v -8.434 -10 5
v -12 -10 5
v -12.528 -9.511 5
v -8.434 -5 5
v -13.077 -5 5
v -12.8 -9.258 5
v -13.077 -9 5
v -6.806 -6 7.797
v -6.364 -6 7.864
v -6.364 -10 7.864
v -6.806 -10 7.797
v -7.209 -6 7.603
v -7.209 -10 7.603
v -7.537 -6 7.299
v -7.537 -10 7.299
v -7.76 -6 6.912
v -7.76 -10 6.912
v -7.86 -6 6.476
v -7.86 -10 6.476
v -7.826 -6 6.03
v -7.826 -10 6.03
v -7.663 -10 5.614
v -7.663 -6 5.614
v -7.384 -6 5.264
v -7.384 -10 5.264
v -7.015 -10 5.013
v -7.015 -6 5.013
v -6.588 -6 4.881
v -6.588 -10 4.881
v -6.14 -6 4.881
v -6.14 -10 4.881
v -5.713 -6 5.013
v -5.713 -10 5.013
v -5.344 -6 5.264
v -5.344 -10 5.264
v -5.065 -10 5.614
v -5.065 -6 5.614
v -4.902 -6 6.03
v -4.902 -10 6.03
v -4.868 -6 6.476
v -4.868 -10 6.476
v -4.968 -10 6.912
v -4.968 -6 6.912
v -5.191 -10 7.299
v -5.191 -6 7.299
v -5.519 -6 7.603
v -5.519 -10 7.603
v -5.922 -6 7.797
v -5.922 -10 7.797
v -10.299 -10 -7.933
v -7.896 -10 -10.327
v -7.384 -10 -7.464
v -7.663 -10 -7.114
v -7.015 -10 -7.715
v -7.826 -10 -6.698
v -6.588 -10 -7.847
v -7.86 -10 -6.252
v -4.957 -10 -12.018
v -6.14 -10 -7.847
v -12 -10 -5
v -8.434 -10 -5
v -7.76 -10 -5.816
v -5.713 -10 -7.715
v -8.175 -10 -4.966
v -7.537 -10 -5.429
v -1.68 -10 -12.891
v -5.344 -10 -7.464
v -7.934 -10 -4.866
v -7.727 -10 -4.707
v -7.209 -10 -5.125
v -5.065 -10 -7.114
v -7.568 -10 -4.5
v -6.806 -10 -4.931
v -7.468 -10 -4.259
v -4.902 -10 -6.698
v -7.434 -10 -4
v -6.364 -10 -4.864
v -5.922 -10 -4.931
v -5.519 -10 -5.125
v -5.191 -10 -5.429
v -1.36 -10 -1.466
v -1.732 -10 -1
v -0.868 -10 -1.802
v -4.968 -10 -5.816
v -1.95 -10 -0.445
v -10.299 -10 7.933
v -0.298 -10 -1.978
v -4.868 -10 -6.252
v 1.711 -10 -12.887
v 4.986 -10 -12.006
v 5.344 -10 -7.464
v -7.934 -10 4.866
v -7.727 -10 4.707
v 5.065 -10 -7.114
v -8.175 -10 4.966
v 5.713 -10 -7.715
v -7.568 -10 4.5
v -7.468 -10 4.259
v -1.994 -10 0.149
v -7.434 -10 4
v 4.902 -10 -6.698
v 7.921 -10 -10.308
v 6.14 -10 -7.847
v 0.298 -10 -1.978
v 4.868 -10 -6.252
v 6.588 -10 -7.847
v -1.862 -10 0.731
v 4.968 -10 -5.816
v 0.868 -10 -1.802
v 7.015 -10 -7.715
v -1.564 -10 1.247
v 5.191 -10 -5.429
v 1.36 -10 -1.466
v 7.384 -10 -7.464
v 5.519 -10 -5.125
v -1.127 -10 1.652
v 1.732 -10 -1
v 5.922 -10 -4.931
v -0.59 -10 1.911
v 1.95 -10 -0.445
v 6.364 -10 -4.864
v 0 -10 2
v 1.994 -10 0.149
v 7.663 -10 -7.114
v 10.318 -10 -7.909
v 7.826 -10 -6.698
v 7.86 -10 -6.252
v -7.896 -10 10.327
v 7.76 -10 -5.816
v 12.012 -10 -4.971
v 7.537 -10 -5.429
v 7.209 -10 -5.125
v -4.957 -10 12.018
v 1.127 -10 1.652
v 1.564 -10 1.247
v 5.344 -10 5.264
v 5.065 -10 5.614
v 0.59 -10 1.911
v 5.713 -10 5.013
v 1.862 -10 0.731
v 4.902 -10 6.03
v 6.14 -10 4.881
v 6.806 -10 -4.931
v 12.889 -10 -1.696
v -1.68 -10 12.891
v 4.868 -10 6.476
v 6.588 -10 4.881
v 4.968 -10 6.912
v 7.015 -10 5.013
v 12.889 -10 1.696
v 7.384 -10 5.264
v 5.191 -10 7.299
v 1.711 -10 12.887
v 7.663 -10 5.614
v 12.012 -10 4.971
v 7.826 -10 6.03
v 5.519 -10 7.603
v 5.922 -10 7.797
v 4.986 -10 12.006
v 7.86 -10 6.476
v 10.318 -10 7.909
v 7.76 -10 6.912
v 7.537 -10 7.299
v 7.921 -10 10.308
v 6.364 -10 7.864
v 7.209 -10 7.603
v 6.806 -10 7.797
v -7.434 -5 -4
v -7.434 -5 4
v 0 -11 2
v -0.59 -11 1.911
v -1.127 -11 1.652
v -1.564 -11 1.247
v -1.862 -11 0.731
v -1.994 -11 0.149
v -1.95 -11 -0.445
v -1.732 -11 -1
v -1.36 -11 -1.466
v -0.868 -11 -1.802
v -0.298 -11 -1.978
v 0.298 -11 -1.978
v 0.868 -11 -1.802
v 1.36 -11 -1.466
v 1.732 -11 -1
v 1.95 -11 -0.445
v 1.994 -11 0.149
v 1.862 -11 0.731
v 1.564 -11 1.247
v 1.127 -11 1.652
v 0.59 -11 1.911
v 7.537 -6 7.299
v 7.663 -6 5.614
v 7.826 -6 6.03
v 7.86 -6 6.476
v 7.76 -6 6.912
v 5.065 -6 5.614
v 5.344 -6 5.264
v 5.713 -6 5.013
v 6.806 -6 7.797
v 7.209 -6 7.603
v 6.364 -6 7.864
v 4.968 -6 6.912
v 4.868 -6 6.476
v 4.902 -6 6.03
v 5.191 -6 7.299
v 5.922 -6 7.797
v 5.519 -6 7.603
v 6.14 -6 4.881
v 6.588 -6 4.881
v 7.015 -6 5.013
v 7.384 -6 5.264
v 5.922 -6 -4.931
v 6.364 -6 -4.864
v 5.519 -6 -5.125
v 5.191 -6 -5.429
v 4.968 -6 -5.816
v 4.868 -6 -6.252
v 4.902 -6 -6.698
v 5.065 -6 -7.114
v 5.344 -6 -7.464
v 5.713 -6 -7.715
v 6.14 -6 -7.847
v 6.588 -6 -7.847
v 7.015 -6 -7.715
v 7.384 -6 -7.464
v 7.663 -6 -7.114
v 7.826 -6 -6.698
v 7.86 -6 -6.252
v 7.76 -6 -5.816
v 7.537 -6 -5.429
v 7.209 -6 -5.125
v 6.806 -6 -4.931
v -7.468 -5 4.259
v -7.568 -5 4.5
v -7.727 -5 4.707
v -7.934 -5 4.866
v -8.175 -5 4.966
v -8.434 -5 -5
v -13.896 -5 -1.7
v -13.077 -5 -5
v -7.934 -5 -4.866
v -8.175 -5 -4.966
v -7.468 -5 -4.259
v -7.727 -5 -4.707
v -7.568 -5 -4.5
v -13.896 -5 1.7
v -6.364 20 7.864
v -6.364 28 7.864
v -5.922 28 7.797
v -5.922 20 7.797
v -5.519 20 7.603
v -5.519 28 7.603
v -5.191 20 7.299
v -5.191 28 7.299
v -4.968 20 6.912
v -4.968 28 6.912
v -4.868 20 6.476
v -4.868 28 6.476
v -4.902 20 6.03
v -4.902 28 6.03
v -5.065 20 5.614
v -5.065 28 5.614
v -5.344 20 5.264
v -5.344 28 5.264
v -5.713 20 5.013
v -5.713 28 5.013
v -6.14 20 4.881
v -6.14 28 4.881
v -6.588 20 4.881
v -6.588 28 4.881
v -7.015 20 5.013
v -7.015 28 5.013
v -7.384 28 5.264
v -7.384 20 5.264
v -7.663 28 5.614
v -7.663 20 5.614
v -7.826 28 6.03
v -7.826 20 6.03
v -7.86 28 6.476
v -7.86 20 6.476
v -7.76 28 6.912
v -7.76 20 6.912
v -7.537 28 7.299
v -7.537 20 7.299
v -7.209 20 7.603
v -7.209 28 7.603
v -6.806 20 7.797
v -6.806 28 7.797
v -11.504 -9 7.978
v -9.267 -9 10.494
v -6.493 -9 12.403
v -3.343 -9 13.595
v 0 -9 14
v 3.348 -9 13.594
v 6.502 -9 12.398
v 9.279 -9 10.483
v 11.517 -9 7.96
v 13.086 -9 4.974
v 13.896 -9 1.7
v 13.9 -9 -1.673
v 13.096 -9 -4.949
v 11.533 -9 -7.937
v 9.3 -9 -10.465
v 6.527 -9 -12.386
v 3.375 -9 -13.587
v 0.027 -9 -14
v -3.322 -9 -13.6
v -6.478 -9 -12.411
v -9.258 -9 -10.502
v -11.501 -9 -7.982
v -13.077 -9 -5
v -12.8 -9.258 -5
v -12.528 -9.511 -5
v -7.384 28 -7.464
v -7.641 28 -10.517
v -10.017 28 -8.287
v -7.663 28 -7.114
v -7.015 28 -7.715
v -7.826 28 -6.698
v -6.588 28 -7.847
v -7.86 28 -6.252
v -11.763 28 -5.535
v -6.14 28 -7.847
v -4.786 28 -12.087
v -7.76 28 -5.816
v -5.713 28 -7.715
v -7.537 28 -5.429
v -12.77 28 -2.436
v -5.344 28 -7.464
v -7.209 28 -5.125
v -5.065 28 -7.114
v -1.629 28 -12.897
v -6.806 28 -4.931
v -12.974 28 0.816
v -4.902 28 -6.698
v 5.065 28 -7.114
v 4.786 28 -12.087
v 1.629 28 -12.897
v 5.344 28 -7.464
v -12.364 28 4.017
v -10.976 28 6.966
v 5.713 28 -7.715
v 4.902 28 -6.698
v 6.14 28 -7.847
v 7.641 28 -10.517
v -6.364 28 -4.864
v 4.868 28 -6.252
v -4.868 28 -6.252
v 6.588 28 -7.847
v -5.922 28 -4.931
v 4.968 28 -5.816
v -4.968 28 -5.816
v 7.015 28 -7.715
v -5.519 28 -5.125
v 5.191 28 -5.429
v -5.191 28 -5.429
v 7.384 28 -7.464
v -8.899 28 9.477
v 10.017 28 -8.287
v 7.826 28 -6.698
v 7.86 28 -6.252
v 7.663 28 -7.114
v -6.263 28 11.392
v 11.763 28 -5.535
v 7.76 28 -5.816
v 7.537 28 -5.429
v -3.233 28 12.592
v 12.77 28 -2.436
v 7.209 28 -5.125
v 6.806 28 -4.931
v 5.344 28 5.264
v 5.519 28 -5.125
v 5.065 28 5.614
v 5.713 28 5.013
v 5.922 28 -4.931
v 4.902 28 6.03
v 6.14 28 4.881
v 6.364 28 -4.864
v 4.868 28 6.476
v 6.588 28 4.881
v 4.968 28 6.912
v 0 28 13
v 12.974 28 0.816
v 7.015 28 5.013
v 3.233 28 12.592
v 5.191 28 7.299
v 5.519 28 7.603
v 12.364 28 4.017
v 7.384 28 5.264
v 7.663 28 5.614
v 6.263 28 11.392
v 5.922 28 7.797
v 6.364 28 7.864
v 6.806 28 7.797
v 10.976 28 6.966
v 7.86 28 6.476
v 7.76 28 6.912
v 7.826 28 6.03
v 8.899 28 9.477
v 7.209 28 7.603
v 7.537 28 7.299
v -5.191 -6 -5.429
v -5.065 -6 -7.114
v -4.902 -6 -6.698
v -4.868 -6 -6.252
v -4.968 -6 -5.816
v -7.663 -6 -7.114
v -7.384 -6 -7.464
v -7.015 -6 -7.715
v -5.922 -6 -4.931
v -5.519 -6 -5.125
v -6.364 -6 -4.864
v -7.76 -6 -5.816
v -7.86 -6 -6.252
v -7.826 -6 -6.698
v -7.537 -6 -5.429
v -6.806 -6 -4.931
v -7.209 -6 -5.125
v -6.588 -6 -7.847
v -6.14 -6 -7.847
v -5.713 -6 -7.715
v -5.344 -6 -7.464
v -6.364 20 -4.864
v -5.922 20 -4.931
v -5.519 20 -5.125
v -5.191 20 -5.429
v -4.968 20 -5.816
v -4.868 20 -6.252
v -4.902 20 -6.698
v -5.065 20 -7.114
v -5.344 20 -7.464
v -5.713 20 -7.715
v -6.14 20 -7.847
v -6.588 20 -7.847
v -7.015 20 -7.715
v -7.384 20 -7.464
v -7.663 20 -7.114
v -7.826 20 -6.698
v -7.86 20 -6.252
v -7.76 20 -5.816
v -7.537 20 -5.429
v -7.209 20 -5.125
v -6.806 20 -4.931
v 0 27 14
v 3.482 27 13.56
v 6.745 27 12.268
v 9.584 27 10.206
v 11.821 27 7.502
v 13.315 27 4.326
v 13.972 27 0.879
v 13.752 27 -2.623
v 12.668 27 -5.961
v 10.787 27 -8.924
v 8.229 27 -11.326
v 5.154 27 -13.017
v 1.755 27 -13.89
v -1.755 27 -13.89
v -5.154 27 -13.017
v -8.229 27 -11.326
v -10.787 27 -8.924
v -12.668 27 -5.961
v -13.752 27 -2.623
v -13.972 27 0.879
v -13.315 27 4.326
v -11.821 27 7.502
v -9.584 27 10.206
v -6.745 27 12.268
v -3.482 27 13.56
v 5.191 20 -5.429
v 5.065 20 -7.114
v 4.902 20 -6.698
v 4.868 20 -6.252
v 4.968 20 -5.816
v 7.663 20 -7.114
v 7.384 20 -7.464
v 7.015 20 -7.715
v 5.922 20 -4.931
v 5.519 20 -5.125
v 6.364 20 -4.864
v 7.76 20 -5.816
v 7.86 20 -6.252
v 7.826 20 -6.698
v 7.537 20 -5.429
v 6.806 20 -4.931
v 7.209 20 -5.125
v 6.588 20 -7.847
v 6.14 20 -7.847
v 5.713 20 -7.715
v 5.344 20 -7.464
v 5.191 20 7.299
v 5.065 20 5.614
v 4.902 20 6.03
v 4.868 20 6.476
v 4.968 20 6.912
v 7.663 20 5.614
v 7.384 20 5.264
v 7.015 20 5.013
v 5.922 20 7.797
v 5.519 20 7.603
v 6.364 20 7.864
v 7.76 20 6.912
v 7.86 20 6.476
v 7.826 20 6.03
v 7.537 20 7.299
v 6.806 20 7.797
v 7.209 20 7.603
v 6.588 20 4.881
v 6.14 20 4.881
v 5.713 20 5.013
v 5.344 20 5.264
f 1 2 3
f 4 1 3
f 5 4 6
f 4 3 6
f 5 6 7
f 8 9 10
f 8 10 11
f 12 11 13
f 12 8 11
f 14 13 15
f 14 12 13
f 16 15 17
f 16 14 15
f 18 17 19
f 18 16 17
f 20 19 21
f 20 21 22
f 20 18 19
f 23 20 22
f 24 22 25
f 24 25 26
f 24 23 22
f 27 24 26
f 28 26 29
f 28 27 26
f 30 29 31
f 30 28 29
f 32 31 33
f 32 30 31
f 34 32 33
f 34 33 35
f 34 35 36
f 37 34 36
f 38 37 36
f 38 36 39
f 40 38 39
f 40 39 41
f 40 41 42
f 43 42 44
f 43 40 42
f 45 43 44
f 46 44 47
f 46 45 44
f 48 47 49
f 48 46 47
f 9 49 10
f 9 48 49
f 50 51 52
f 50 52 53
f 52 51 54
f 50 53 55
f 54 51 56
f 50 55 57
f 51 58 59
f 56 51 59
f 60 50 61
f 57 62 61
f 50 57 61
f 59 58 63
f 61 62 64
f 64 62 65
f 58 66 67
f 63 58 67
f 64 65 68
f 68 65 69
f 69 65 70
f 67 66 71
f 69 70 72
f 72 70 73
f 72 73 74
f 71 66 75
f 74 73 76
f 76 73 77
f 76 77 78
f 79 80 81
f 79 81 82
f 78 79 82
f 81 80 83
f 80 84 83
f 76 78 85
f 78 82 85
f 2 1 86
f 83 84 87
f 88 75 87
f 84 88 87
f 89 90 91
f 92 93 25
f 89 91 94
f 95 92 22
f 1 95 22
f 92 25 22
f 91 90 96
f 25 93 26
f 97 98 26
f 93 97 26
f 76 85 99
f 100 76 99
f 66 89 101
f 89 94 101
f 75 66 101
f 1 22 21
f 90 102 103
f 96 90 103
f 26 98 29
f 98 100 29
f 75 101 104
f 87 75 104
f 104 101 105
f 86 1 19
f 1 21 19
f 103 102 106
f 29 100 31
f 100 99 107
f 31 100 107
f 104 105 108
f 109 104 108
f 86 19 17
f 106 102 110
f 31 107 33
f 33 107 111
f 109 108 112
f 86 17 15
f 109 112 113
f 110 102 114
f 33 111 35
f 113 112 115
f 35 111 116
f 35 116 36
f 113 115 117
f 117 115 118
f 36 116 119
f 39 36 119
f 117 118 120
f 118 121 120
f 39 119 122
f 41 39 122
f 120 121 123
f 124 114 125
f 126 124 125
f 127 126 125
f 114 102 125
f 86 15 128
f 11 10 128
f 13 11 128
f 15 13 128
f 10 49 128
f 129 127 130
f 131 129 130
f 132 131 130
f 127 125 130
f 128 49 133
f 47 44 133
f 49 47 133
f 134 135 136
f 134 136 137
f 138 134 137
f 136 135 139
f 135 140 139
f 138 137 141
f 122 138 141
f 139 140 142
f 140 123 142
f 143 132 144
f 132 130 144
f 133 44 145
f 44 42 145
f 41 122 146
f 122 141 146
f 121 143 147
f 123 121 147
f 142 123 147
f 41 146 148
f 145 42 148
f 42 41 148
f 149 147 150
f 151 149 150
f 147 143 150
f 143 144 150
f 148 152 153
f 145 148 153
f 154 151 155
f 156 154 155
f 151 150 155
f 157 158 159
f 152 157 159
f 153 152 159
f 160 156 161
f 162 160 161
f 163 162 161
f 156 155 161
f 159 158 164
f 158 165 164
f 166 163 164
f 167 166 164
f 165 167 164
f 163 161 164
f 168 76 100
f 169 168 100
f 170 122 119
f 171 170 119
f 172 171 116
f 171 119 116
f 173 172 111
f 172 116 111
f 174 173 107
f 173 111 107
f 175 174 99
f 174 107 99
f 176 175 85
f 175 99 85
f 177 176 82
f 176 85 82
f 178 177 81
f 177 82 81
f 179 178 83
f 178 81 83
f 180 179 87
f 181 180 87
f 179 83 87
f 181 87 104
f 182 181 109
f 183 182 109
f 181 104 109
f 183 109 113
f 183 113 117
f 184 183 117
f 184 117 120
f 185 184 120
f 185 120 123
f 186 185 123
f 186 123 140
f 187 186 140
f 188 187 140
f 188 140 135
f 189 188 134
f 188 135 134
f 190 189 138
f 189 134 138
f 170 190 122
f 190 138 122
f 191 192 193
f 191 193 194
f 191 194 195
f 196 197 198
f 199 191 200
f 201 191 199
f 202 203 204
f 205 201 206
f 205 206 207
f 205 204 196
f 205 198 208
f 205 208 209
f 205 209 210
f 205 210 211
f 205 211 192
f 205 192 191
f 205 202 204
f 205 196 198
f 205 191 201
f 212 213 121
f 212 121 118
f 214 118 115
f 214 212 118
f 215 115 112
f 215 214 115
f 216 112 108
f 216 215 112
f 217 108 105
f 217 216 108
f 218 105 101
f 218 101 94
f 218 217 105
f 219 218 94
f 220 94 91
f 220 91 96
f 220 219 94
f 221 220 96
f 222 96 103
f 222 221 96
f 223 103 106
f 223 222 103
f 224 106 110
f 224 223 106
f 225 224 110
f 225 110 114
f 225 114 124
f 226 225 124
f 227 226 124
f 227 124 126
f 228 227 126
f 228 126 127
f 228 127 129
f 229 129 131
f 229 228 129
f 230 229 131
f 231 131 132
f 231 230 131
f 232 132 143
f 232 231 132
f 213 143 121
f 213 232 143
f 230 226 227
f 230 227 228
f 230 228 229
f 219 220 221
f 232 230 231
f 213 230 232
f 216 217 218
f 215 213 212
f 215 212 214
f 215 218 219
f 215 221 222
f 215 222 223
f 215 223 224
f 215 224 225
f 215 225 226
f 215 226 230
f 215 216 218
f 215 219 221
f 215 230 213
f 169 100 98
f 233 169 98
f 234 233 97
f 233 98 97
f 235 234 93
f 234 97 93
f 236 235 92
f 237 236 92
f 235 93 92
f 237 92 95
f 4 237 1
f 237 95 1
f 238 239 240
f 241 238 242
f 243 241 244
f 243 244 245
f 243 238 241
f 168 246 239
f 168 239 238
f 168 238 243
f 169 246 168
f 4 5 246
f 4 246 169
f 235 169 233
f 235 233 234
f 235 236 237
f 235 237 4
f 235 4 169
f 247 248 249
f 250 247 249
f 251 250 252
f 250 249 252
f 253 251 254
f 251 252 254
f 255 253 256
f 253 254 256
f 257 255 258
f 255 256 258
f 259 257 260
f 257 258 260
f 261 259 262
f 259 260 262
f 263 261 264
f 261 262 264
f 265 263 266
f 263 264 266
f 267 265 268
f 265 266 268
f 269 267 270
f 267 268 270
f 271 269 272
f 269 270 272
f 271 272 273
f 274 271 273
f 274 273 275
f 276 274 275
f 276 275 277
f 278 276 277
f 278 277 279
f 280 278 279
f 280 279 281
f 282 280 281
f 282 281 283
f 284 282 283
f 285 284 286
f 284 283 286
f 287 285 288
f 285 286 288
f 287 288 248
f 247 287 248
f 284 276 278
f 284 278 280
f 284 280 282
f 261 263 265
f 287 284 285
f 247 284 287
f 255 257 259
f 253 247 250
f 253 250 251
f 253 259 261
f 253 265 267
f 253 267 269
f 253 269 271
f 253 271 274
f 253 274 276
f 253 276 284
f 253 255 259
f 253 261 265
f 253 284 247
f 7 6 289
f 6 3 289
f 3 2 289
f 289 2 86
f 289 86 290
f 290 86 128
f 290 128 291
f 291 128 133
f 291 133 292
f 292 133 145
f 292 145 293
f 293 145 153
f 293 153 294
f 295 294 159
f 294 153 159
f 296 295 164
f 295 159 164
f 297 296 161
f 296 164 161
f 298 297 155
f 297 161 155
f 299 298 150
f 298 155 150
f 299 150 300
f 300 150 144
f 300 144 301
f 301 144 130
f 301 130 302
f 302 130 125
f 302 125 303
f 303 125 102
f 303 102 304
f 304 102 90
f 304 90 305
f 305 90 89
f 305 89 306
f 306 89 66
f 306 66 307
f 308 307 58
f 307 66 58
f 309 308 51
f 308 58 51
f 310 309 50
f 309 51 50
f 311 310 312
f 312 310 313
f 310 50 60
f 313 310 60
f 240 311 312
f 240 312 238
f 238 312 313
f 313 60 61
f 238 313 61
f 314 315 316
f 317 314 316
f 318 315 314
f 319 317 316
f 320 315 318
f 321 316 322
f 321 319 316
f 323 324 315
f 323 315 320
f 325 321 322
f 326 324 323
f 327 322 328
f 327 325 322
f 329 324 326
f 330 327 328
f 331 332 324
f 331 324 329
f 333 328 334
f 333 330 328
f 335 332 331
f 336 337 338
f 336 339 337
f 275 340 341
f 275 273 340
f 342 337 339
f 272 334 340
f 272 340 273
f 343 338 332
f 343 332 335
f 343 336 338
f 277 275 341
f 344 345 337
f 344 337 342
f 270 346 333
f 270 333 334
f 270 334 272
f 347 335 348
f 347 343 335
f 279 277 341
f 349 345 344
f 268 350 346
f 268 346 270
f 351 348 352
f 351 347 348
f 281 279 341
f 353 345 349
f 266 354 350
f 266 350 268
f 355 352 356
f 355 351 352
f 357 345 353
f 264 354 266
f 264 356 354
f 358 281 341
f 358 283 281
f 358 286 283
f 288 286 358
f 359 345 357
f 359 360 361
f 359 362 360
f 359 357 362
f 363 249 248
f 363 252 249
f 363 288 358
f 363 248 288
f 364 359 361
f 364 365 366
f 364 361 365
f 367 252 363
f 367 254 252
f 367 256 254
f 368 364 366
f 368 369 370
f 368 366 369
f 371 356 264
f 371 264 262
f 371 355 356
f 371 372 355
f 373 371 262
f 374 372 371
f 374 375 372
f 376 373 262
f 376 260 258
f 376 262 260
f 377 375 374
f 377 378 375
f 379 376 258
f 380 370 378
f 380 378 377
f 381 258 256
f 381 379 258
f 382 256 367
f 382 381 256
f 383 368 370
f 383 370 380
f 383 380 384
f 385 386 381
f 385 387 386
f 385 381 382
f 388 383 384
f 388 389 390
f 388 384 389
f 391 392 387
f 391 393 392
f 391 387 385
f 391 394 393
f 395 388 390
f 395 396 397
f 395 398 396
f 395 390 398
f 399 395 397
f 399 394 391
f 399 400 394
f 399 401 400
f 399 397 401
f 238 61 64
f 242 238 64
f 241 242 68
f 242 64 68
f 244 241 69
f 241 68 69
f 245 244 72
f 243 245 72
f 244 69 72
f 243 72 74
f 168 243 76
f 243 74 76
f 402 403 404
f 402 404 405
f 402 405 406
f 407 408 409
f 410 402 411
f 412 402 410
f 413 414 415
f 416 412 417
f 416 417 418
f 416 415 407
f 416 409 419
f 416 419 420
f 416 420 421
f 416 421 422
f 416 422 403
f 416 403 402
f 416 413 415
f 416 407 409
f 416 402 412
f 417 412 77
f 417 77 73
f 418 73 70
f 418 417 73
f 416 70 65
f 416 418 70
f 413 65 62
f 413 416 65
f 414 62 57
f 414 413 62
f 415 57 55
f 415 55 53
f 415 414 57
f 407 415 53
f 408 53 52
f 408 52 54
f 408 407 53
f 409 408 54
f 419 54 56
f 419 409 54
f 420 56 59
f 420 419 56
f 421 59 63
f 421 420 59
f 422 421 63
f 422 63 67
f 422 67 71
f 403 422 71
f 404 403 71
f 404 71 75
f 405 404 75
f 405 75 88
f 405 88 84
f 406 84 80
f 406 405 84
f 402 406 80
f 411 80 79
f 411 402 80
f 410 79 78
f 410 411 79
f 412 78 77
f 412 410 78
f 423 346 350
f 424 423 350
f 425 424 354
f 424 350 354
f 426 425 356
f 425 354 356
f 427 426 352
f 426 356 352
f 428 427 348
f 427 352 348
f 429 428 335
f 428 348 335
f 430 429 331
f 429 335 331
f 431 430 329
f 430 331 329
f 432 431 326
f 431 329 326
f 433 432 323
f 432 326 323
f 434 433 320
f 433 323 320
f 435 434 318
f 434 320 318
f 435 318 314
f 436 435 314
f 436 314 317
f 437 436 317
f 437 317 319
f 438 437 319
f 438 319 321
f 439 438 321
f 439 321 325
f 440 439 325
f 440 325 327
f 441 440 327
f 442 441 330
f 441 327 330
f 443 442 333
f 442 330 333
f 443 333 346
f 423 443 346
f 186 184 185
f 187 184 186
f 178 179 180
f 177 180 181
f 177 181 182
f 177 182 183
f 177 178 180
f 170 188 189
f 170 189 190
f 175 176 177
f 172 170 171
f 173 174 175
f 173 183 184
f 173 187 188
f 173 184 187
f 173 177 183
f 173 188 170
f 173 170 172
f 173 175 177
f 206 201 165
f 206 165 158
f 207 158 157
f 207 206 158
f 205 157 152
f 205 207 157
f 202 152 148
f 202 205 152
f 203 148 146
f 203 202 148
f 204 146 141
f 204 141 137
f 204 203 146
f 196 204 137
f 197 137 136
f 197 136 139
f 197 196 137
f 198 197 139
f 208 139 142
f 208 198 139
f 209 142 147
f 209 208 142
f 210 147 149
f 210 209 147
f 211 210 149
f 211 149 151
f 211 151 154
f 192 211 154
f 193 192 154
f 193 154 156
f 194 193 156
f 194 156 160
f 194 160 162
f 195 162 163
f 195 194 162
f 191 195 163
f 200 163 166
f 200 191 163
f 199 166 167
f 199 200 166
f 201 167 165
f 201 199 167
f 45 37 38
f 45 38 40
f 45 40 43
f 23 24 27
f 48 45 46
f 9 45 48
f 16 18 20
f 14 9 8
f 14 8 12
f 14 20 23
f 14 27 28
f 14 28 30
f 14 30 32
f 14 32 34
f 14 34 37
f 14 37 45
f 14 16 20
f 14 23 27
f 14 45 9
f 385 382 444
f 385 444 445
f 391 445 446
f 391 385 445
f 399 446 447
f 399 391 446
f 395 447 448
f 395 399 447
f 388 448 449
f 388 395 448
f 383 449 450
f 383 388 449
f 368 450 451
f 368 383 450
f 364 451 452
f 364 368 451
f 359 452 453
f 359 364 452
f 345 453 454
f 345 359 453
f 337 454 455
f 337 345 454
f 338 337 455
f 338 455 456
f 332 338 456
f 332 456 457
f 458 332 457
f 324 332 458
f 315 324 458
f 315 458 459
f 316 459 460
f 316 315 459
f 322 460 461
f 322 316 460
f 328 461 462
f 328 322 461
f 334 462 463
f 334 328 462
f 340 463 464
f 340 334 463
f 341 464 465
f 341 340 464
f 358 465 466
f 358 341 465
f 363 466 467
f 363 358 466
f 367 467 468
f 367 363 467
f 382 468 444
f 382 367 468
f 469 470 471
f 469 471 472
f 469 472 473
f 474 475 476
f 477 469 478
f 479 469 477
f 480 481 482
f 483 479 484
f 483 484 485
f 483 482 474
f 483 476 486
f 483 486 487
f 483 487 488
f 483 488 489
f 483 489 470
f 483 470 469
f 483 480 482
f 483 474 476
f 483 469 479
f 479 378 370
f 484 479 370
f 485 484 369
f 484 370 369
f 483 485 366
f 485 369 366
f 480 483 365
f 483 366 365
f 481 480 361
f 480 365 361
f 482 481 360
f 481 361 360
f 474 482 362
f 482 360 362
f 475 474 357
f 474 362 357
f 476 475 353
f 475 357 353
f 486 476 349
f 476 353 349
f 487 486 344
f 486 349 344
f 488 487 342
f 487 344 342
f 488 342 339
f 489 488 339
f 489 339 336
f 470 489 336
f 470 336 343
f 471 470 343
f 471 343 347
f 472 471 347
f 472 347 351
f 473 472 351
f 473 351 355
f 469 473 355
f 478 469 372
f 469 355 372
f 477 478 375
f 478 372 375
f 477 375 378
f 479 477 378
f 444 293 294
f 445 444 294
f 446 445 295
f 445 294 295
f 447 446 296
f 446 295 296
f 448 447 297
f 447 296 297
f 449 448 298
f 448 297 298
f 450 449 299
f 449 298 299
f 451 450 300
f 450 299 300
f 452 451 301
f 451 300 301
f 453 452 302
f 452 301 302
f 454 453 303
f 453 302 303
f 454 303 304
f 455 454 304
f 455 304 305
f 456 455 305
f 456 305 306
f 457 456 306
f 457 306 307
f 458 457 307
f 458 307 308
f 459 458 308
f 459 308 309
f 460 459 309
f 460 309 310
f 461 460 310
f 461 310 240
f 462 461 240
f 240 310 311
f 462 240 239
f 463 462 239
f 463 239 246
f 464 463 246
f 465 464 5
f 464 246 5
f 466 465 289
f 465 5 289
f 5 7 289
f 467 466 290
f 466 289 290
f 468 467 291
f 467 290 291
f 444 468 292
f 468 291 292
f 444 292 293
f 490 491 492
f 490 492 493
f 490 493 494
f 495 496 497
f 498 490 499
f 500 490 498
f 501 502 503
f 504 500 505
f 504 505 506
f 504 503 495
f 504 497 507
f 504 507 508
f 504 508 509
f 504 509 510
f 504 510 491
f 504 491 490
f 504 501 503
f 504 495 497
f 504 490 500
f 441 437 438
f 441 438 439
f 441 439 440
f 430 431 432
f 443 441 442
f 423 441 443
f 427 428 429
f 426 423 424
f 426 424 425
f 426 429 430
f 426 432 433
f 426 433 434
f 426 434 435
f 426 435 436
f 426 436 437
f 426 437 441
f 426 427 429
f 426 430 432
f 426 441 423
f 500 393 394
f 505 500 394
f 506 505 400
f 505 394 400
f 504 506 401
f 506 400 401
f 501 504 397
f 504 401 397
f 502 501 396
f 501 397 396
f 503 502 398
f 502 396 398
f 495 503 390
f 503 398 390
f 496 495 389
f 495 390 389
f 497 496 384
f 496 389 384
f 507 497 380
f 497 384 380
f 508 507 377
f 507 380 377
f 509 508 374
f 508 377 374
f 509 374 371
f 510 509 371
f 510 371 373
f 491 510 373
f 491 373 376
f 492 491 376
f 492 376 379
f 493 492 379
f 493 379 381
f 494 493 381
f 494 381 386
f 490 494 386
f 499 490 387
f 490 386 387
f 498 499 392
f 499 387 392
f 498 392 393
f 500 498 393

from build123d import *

# Parameters (mm, degrees)
BOSS_EXTRUDE1_DEPTH      = 28
BOSS_EXTRUDE1_DEPTH_BACK = 10
SKETCH1_R                = 14
SKETCH2_R                = 1.5
CUT_EXTRUDE1_DEPTH       = 8
CUT_EXTRUDE2_START       = -4
SKETCH3_R                = 1.5
CUT_EXTRUDE2_DEPTH       = 4
CUT_EXTRUDE3_DEPTH       = 5
SKETCH3_4_R              = 2
BOSS_EXTRUDE2_DEPTH      = 1
CHAMFER1_SIZE            = 1


with BuildPart() as part:
    # Sketch1 → Boss-Extrude1 (new, two sides: drawn at the far end of the back side and taken through both)
    with BuildSketch(Plane(origin=(0, 0, 0), x_dir=(1, 0, 0), z_dir=(0, 1, 0)).offset(-BOSS_EXTRUDE1_DEPTH_BACK)):
        Circle(SKETCH1_R)
    extrude(amount=BOSS_EXTRUDE1_DEPTH + BOSS_EXTRUDE1_DEPTH_BACK)

    # Sketch2 → Cut-Extrude1 (cut)
    with BuildSketch(Plane(origin=(0, 28, 0), x_dir=(1, 0, 0), z_dir=(0, 1, 0))):
        with Locations((-6.363961031, 6.363961031)):
            Circle(SKETCH2_R)
        with Locations((6.363961031, 6.363961031)):
            Circle(SKETCH2_R)
        with Locations((6.363961031, -6.363961031)):
            Circle(SKETCH2_R)
        with Locations((-6.363961031, -6.363961031)):
            Circle(SKETCH2_R)
    extrude(amount=-CUT_EXTRUDE1_DEPTH, mode=Mode.SUBTRACT)

    # Sketch3 → Cut-Extrude2 (cut)
    with BuildSketch(Plane.XZ.offset(10).offset(CUT_EXTRUDE2_START)):
        with Locations((-6.363961031, 6.363961031)):
            Circle(SKETCH3_R)
        with Locations((6.363961031, 6.363961031)):
            Circle(SKETCH3_R)
        with Locations((6.363961031, -6.363961031)):
            Circle(SKETCH3_R)
        with Locations((-6.363961031, -6.363961031)):
            Circle(SKETCH3_R)
    extrude(amount=CUT_EXTRUDE2_DEPTH, mode=Mode.SUBTRACT)

    # Sketch3<3> → Cut-Extrude3 (cut)
    with BuildSketch(Plane.XZ.offset(10)):
        with BuildLine():
            Line((-20.566233409, 5), (-20.566233409, -5))
            Line((-20.566233409, -5), (-8.433766591, -5))
            ThreePointArc((-8.433766591, -5), (-7.726659809, -4.707106781), (-7.433766591, -4))
            Line((-7.433766591, -4), (-7.433766591, 4))
            ThreePointArc((-7.433766591, 4), (-7.726659809, 4.707106781), (-8.433766591, 5))
            Line((-8.433766591, 5), (-20.566233409, 5))
        make_face()
    extrude(amount=-CUT_EXTRUDE3_DEPTH, mode=Mode.SUBTRACT)

    # Sketch3<4> → Boss-Extrude2 (add)
    with BuildSketch(Plane.XZ.offset(10)):
        Circle(SKETCH3_4_R)
    extrude(amount=BOSS_EXTRUDE2_DEPTH)

    # Chamfer1
    chamfer1_edges = [part.edges().sort_by_distance(p)[0] for p in [
        (-14, 28, 0),
        (2.542267135, -10, -13.767239295),
    ]]
    chamfer(chamfer1_edges, length=CHAMFER1_SIZE)


solid = part.part
